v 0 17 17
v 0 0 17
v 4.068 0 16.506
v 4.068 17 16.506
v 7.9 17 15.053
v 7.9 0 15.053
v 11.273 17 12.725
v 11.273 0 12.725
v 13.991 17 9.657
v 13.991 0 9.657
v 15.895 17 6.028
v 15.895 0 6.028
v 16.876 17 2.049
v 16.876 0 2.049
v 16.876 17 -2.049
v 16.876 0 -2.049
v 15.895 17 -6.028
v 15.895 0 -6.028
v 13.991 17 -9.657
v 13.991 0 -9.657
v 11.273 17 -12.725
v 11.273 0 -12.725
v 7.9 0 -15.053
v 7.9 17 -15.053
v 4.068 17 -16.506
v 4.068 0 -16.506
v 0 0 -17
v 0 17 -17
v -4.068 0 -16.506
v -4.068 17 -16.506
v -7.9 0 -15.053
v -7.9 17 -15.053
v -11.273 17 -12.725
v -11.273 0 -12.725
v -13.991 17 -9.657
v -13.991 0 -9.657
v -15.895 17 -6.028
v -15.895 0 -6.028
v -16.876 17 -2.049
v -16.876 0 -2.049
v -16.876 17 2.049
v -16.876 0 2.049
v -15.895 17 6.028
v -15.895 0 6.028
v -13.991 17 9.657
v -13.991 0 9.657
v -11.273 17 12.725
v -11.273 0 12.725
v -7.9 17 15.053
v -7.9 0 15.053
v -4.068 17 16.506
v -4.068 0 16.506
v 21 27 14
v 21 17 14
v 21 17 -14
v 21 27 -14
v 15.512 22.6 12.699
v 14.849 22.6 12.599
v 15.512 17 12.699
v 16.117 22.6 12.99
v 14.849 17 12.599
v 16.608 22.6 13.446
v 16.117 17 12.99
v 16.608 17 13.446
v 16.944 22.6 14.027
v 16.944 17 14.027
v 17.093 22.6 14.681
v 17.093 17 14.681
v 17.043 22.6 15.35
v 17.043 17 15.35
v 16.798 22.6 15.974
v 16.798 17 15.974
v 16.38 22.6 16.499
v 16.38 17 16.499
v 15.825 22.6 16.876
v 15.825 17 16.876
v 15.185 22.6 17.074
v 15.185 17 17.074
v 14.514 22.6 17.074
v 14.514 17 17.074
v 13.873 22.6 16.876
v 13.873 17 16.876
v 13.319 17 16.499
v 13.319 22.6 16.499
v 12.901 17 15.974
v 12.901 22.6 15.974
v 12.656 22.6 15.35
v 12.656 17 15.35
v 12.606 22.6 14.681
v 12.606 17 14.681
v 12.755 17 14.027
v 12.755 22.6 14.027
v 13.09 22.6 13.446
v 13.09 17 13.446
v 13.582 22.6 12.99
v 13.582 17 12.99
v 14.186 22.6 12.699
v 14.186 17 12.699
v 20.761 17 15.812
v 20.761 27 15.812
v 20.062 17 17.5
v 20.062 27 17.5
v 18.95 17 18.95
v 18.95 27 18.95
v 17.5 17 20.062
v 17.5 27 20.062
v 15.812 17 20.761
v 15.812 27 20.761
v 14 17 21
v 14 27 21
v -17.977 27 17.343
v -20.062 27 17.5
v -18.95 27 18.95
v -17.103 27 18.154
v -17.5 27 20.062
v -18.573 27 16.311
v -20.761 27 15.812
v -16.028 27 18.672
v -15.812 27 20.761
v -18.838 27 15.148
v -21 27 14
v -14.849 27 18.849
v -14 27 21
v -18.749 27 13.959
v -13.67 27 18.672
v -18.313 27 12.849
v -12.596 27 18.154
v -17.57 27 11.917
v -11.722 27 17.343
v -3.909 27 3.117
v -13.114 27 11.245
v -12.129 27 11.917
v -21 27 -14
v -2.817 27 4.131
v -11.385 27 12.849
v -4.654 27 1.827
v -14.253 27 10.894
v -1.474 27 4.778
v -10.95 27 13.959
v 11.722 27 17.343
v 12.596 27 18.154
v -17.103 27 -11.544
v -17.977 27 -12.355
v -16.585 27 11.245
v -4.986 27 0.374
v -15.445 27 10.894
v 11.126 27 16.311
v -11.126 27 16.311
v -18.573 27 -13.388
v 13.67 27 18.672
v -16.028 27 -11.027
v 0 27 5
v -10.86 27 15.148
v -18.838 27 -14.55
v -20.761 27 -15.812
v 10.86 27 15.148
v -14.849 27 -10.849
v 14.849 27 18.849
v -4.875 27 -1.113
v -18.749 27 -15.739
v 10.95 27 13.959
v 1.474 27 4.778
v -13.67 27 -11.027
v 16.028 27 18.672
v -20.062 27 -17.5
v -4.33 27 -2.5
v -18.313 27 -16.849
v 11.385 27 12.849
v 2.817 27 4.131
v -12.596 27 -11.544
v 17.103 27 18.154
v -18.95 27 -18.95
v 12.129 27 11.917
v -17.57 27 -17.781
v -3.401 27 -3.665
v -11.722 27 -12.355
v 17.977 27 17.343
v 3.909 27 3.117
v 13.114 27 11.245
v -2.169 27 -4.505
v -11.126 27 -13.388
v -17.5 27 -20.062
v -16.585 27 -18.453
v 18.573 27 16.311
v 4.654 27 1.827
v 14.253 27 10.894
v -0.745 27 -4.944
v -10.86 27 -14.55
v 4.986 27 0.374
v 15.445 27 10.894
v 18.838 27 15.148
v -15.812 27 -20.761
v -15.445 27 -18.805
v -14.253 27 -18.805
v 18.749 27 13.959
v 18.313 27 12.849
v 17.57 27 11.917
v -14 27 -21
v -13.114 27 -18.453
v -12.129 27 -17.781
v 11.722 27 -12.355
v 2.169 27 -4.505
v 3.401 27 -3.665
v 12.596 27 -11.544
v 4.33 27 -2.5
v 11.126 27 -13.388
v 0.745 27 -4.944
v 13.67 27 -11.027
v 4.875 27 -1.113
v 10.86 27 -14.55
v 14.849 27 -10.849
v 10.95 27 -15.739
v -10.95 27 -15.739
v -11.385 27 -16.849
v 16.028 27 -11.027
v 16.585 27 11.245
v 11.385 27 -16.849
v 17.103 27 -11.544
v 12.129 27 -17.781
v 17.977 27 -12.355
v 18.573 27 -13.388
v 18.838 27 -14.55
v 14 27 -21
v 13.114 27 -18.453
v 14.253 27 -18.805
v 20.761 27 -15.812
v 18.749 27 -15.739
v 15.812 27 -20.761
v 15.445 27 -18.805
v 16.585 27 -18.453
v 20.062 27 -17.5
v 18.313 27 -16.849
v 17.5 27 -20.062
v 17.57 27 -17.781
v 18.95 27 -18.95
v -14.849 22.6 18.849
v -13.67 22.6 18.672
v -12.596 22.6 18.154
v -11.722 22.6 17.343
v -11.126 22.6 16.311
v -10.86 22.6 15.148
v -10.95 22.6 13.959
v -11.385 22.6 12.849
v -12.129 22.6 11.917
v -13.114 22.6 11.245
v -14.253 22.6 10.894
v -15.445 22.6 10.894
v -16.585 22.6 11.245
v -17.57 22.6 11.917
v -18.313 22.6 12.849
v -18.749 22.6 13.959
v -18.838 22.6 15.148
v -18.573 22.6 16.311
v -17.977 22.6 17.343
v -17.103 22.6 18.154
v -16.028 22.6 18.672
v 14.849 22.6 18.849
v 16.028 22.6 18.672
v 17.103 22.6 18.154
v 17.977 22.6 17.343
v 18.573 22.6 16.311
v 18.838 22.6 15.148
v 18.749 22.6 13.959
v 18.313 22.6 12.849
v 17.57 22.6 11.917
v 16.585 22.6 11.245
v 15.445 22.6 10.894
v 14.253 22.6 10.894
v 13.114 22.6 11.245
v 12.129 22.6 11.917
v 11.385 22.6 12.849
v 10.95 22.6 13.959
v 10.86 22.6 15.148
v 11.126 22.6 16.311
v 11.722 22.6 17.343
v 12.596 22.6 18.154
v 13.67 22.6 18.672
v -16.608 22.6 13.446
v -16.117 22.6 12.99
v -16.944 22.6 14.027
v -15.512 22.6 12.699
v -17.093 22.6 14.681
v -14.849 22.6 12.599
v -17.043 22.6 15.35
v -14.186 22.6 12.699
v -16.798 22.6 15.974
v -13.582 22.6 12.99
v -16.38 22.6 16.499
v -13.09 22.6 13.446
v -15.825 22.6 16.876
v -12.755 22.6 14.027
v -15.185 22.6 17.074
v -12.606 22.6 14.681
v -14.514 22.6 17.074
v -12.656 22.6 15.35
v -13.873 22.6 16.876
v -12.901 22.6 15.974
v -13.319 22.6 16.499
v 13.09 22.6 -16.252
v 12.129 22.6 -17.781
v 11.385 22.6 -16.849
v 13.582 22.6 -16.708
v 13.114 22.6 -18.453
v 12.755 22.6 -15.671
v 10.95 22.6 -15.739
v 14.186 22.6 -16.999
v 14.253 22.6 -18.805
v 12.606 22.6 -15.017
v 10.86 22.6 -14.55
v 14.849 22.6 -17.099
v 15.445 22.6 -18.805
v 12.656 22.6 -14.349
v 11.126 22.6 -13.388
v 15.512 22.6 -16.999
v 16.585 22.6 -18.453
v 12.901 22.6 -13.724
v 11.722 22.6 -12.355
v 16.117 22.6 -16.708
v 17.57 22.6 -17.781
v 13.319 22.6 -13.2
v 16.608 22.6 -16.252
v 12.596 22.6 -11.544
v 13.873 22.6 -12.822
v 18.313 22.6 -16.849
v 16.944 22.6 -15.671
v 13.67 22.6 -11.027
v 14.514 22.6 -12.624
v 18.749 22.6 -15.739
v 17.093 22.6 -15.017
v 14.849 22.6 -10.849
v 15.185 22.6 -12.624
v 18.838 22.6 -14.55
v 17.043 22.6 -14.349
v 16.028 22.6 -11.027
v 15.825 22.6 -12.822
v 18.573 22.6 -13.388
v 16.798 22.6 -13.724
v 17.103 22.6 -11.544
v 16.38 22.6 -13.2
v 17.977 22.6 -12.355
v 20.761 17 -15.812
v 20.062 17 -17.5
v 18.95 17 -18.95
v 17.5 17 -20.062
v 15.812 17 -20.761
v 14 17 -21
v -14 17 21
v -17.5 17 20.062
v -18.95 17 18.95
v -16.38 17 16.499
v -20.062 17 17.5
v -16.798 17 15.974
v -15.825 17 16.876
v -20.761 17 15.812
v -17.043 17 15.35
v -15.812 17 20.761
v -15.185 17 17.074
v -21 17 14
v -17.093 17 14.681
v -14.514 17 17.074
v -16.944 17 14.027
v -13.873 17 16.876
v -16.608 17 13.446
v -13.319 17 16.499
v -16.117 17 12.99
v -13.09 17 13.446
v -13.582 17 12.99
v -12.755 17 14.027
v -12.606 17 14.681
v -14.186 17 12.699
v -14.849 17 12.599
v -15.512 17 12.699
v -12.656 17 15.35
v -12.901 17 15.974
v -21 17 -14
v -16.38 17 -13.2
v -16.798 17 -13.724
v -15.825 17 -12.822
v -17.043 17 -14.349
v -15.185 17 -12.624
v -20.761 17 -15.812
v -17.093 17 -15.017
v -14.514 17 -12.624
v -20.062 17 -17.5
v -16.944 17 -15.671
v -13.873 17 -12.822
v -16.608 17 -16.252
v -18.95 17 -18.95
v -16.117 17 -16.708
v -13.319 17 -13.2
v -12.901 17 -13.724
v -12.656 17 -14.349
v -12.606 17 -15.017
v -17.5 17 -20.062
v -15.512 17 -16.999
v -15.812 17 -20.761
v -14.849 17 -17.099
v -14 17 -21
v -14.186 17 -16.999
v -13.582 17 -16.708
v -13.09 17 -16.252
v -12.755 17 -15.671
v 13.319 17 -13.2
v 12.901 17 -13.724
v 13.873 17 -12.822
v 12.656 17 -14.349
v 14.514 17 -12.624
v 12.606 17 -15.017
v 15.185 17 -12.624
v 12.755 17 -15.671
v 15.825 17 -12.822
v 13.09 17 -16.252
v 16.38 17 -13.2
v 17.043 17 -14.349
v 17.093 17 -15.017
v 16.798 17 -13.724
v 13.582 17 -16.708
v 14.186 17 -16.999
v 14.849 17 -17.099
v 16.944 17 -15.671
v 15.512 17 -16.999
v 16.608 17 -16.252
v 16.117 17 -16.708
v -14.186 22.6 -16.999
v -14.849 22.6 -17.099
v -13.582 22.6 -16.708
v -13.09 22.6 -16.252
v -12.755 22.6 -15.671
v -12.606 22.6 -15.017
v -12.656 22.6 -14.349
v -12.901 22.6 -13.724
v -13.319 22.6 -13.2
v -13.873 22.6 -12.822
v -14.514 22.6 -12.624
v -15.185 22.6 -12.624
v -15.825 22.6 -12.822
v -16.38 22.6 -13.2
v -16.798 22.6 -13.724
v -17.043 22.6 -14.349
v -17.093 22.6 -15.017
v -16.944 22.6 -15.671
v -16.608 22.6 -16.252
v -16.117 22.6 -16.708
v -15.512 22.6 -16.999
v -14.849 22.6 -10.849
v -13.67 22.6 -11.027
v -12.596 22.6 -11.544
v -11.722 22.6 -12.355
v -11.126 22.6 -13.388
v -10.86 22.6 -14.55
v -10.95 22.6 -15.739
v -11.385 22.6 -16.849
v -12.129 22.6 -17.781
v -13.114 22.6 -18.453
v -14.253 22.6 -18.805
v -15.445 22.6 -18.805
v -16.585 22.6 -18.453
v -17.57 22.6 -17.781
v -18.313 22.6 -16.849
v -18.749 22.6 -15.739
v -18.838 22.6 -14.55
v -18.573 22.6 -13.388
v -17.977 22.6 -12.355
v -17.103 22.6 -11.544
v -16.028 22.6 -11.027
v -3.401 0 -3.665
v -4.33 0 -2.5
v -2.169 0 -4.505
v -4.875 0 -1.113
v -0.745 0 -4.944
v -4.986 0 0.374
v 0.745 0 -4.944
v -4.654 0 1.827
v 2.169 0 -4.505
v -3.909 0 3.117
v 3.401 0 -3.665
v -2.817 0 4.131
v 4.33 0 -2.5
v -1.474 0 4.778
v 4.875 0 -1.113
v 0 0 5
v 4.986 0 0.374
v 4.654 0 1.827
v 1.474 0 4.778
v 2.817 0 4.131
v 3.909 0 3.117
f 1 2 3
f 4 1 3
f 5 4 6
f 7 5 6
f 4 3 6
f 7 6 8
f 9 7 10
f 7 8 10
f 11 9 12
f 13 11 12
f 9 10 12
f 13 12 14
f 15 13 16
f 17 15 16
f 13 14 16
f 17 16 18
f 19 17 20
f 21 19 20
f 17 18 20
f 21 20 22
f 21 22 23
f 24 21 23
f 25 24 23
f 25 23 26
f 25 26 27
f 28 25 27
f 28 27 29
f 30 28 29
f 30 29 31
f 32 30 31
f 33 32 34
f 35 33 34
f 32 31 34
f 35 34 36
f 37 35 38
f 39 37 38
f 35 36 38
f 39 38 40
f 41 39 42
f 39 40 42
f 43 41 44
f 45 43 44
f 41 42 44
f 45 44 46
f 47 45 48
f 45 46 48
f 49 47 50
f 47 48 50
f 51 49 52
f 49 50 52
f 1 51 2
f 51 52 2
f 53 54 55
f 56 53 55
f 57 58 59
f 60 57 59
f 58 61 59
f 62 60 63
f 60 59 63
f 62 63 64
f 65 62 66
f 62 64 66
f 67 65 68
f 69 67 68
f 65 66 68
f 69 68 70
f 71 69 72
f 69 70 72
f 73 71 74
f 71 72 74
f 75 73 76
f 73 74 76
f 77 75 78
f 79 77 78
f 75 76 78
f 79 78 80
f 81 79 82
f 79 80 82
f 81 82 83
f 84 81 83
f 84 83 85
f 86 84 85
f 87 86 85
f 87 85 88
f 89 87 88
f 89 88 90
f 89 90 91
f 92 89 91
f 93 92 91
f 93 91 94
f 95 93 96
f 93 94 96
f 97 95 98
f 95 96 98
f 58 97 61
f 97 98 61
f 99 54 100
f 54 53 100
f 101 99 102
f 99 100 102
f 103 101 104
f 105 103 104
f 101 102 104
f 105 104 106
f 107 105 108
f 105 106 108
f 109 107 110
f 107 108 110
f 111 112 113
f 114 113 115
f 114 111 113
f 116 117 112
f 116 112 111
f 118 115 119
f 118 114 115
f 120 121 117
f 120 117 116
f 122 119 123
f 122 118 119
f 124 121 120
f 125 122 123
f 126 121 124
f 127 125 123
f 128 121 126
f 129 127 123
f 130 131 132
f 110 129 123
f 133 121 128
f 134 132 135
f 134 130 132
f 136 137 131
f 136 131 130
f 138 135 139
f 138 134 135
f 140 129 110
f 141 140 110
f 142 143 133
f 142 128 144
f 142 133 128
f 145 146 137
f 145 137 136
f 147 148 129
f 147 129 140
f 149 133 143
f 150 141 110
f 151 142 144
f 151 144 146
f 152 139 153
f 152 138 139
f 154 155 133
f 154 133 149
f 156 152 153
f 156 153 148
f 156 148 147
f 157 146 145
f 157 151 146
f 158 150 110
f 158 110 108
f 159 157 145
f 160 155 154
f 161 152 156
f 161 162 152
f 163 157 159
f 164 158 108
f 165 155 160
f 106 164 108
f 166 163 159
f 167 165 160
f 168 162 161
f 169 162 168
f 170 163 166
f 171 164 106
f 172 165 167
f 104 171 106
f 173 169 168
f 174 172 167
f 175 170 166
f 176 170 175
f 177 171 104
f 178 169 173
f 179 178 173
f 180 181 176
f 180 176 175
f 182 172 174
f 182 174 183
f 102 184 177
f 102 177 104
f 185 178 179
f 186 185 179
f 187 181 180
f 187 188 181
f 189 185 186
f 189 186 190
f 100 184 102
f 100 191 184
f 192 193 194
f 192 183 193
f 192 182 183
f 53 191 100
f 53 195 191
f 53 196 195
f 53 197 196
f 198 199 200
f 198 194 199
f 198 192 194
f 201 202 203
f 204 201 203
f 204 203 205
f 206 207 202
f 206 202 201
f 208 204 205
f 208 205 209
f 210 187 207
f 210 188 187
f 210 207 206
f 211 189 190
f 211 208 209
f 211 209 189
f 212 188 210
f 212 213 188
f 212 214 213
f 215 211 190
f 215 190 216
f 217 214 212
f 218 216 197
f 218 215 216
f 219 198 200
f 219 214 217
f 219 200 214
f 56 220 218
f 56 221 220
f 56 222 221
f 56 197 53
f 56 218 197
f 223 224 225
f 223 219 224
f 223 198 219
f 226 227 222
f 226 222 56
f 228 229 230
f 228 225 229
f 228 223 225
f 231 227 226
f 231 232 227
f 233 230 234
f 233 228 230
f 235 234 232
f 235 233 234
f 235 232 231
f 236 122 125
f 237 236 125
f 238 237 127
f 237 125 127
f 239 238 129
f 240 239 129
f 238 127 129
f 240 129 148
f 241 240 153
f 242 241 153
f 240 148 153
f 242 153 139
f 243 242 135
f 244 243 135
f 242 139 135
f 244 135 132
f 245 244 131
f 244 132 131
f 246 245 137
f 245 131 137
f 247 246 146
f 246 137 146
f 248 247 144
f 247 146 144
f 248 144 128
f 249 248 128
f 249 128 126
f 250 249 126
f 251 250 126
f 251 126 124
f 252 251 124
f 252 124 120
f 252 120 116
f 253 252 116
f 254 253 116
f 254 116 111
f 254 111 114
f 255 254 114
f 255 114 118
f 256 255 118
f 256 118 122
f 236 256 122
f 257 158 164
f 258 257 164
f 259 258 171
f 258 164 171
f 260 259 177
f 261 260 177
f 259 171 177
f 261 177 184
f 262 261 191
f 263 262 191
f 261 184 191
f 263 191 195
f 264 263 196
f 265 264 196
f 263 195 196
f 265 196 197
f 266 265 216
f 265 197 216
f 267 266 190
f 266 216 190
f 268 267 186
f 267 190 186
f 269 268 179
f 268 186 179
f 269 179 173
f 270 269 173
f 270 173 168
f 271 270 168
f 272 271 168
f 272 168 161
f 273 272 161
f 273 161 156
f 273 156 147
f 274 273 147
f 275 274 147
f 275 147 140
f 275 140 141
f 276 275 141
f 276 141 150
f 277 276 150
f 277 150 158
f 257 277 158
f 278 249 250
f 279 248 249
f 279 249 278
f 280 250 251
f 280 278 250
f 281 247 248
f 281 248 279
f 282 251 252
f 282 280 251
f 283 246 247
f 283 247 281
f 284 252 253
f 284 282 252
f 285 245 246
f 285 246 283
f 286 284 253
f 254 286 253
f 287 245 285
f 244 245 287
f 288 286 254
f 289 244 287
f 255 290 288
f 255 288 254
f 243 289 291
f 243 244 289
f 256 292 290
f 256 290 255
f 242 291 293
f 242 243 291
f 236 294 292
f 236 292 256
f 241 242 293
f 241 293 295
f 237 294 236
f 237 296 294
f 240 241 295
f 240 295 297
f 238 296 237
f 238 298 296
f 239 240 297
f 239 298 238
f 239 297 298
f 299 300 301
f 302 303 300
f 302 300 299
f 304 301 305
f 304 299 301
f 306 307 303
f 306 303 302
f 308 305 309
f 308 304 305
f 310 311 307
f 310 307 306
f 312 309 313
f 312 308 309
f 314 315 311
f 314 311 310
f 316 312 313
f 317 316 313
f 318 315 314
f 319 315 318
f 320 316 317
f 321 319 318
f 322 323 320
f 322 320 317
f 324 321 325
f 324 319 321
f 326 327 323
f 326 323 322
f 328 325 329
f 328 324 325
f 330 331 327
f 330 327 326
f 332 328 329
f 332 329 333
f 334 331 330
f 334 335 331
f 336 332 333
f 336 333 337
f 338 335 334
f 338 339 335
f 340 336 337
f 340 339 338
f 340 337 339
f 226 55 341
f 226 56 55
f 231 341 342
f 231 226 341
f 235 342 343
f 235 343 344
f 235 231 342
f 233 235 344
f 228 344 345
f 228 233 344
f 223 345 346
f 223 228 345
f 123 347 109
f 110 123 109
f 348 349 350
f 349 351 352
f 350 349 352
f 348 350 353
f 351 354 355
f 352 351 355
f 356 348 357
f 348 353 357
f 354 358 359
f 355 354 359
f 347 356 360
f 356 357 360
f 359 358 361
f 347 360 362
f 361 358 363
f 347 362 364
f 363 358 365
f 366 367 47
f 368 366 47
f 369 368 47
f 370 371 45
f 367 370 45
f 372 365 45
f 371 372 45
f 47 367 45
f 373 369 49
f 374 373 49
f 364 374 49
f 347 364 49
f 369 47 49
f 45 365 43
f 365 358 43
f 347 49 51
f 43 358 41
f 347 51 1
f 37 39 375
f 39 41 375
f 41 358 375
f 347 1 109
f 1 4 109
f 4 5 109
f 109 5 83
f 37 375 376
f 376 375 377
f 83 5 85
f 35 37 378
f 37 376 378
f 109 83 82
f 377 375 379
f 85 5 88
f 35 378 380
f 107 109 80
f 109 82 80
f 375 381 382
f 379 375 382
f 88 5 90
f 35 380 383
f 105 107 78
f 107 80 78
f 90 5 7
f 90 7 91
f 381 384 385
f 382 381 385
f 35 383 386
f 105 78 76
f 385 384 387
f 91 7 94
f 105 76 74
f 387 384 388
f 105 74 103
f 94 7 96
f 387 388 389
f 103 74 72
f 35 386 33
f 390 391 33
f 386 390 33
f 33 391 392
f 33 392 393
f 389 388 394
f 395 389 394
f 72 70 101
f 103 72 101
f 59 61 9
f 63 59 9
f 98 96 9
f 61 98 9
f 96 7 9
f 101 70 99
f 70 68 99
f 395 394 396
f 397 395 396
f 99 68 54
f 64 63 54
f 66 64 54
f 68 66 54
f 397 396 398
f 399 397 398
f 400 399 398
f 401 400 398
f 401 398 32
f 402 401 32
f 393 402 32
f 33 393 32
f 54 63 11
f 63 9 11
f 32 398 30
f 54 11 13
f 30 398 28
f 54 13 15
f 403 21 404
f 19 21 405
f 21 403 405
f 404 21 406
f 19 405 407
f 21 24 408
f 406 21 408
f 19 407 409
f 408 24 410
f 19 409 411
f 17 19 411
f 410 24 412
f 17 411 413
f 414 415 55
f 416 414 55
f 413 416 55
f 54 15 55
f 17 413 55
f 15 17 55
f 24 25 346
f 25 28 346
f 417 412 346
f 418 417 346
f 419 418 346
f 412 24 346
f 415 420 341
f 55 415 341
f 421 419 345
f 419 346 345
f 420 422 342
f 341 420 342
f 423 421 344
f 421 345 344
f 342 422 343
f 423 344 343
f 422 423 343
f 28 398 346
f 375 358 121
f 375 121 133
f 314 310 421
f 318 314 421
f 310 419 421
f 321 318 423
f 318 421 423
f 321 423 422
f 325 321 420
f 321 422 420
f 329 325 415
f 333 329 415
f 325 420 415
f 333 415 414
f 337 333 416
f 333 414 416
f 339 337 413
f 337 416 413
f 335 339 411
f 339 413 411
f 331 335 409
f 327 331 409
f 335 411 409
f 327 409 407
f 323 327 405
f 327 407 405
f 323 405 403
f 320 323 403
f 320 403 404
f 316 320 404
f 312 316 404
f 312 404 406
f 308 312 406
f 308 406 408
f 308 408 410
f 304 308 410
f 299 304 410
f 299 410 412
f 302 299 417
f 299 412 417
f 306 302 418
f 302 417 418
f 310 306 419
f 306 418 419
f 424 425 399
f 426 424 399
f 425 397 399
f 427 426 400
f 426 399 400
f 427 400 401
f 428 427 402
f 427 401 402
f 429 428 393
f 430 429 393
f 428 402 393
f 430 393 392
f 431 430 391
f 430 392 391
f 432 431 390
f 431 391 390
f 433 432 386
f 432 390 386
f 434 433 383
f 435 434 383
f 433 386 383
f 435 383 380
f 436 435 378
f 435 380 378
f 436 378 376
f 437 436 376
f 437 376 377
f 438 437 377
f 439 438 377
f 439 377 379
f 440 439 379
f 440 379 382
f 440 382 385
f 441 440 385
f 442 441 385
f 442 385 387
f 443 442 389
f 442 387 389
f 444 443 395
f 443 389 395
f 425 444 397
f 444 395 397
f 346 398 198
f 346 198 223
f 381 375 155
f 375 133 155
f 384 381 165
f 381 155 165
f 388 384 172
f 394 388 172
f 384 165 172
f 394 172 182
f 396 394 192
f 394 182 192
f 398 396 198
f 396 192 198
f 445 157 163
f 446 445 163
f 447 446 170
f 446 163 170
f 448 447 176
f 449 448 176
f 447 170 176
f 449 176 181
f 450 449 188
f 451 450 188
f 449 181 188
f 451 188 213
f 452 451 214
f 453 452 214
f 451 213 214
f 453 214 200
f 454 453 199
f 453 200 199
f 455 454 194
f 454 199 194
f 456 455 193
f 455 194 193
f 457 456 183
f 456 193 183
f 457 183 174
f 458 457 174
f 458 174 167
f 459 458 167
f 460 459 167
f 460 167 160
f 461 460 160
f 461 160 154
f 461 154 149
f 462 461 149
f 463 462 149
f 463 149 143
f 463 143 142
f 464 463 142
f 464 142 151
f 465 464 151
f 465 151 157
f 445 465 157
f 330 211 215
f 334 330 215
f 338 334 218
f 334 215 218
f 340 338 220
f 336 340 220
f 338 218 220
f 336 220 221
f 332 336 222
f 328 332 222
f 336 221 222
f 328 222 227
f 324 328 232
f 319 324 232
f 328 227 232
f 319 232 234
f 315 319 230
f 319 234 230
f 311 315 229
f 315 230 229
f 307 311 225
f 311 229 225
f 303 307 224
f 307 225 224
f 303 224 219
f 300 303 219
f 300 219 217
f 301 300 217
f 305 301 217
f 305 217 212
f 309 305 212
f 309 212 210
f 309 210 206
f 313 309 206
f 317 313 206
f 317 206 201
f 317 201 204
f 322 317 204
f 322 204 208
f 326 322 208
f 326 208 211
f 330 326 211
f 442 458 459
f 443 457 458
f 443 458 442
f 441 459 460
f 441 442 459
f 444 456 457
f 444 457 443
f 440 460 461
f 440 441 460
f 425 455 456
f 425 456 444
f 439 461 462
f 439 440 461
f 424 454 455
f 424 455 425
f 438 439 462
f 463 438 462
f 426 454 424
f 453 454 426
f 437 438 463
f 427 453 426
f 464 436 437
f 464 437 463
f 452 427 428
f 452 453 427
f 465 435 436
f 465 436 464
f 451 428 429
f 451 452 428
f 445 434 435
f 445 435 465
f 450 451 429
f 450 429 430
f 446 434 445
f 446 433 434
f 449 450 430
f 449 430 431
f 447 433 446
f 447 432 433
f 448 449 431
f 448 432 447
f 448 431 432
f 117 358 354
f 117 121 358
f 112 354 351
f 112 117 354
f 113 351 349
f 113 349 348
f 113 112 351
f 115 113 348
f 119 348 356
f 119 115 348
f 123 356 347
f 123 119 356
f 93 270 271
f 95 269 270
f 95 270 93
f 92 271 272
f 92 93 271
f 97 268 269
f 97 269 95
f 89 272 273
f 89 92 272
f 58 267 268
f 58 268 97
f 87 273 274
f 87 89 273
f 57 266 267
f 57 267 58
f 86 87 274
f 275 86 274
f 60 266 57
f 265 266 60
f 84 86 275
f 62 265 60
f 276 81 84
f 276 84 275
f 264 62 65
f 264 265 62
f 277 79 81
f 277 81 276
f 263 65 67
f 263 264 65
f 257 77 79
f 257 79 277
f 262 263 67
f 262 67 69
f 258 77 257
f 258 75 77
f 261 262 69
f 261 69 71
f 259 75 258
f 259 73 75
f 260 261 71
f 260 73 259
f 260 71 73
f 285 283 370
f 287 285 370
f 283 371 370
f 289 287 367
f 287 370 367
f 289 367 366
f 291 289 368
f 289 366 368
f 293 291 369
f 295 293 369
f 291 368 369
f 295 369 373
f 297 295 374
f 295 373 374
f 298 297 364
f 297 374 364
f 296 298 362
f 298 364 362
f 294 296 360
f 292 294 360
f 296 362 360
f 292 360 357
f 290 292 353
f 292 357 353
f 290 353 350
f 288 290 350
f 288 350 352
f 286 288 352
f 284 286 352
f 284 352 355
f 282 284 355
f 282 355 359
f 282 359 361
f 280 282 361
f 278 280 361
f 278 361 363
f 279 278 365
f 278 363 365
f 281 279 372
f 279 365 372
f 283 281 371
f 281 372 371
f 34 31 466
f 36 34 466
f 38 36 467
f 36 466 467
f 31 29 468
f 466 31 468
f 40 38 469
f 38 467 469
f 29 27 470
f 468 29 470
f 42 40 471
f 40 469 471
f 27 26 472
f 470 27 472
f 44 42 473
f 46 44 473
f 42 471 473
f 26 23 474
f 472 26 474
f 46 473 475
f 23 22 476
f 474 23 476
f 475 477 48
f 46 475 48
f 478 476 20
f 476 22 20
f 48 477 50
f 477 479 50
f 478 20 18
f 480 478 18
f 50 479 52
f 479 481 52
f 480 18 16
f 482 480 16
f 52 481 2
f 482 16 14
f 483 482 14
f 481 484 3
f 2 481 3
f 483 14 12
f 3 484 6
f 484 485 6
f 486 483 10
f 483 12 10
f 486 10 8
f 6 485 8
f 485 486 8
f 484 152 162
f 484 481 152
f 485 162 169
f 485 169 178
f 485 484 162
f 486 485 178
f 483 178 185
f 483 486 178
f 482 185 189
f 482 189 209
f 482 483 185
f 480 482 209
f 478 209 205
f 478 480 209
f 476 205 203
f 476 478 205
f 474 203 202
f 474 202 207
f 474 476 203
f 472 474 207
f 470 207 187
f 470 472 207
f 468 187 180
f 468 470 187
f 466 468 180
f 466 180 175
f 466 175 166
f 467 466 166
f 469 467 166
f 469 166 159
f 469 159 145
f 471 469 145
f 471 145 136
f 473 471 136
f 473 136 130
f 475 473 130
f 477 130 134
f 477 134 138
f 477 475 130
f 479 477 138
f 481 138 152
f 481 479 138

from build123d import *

# Parameters (mm, degrees)
SKETCH1_R                                           = 17
SKETCH1_R_2                                         = 5
BOSS_EXTRUDE1_DEPTH                                 = 17
SKETCH2_W                                           = 42
SKETCH2_H                                           = 42
SKETCH2_R                                           = 5
BOSS_EXTRUDE2_DEPTH                                 = 10
FILLET1_R                                           = 7
CBORE_FOR_M4_HEX_SOCKET_HEAD_CAP_SCREW1_D           = 4.5
CBORE_FOR_M4_HEX_SOCKET_HEAD_CAP_SCREW1_CBORE_D     = 8
CBORE_FOR_M4_HEX_SOCKET_HEAD_CAP_SCREW1_CBORE_DEPTH = 4.4


with BuildPart() as part:
    # Sketch1 → Boss-Extrude1 (new body)
    with BuildSketch(Plane(origin=(0, 0, 0), x_dir=(1, 0, 0), z_dir=(0, 1, 0))):
        with Locations(Location((0, 0, 0), (0, 0, 270))):
            Circle(SKETCH1_R)
        with Locations(Location((0, 0, 0), (0, 0, 270))):
            Circle(SKETCH1_R_2, mode=Mode.SUBTRACT)
    extrude(amount=BOSS_EXTRUDE1_DEPTH)

    # Sketch2 → Boss-Extrude2 (add)
    with BuildSketch(Plane(origin=(0, 17, 0), x_dir=(1, 0, 0), z_dir=(0, 1, 0))):
        Rectangle(SKETCH2_W, SKETCH2_H)
        with Locations(Location((0, 0, 0), (0, 0, 270))):
            Circle(SKETCH2_R, mode=Mode.SUBTRACT)
    extrude(amount=BOSS_EXTRUDE2_DEPTH)

    # Fillet1
    fillet1_edges = [part.edges().sort_by_distance(p)[0] for p in [
        (-21, 22, -21),
        (-21, 22, 21),
        (21, 22, 21),
        (21, 22, -21),
    ]]
    fillet(fillet1_edges, radius=FILLET1_R)

    # CBORE for M4 Hex Socket Head Cap Screw1 (through all)
    with Locations(Plane(origin=(-14.849242405, 27, -14.849242405), x_dir=(0, 0, 1), z_dir=(0, 1, 0))):
        with Locations((0, 0), (0, 29.69848481), (29.69848481, 29.69848481), (29.69848481, 0)):
            CounterBoreHole(CBORE_FOR_M4_HEX_SOCKET_HEAD_CAP_SCREW1_D / 2, CBORE_FOR_M4_HEX_SOCKET_HEAD_CAP_SCREW1_CBORE_D / 2, CBORE_FOR_M4_HEX_SOCKET_HEAD_CAP_SCREW1_CBORE_DEPTH)


solid = part.part
